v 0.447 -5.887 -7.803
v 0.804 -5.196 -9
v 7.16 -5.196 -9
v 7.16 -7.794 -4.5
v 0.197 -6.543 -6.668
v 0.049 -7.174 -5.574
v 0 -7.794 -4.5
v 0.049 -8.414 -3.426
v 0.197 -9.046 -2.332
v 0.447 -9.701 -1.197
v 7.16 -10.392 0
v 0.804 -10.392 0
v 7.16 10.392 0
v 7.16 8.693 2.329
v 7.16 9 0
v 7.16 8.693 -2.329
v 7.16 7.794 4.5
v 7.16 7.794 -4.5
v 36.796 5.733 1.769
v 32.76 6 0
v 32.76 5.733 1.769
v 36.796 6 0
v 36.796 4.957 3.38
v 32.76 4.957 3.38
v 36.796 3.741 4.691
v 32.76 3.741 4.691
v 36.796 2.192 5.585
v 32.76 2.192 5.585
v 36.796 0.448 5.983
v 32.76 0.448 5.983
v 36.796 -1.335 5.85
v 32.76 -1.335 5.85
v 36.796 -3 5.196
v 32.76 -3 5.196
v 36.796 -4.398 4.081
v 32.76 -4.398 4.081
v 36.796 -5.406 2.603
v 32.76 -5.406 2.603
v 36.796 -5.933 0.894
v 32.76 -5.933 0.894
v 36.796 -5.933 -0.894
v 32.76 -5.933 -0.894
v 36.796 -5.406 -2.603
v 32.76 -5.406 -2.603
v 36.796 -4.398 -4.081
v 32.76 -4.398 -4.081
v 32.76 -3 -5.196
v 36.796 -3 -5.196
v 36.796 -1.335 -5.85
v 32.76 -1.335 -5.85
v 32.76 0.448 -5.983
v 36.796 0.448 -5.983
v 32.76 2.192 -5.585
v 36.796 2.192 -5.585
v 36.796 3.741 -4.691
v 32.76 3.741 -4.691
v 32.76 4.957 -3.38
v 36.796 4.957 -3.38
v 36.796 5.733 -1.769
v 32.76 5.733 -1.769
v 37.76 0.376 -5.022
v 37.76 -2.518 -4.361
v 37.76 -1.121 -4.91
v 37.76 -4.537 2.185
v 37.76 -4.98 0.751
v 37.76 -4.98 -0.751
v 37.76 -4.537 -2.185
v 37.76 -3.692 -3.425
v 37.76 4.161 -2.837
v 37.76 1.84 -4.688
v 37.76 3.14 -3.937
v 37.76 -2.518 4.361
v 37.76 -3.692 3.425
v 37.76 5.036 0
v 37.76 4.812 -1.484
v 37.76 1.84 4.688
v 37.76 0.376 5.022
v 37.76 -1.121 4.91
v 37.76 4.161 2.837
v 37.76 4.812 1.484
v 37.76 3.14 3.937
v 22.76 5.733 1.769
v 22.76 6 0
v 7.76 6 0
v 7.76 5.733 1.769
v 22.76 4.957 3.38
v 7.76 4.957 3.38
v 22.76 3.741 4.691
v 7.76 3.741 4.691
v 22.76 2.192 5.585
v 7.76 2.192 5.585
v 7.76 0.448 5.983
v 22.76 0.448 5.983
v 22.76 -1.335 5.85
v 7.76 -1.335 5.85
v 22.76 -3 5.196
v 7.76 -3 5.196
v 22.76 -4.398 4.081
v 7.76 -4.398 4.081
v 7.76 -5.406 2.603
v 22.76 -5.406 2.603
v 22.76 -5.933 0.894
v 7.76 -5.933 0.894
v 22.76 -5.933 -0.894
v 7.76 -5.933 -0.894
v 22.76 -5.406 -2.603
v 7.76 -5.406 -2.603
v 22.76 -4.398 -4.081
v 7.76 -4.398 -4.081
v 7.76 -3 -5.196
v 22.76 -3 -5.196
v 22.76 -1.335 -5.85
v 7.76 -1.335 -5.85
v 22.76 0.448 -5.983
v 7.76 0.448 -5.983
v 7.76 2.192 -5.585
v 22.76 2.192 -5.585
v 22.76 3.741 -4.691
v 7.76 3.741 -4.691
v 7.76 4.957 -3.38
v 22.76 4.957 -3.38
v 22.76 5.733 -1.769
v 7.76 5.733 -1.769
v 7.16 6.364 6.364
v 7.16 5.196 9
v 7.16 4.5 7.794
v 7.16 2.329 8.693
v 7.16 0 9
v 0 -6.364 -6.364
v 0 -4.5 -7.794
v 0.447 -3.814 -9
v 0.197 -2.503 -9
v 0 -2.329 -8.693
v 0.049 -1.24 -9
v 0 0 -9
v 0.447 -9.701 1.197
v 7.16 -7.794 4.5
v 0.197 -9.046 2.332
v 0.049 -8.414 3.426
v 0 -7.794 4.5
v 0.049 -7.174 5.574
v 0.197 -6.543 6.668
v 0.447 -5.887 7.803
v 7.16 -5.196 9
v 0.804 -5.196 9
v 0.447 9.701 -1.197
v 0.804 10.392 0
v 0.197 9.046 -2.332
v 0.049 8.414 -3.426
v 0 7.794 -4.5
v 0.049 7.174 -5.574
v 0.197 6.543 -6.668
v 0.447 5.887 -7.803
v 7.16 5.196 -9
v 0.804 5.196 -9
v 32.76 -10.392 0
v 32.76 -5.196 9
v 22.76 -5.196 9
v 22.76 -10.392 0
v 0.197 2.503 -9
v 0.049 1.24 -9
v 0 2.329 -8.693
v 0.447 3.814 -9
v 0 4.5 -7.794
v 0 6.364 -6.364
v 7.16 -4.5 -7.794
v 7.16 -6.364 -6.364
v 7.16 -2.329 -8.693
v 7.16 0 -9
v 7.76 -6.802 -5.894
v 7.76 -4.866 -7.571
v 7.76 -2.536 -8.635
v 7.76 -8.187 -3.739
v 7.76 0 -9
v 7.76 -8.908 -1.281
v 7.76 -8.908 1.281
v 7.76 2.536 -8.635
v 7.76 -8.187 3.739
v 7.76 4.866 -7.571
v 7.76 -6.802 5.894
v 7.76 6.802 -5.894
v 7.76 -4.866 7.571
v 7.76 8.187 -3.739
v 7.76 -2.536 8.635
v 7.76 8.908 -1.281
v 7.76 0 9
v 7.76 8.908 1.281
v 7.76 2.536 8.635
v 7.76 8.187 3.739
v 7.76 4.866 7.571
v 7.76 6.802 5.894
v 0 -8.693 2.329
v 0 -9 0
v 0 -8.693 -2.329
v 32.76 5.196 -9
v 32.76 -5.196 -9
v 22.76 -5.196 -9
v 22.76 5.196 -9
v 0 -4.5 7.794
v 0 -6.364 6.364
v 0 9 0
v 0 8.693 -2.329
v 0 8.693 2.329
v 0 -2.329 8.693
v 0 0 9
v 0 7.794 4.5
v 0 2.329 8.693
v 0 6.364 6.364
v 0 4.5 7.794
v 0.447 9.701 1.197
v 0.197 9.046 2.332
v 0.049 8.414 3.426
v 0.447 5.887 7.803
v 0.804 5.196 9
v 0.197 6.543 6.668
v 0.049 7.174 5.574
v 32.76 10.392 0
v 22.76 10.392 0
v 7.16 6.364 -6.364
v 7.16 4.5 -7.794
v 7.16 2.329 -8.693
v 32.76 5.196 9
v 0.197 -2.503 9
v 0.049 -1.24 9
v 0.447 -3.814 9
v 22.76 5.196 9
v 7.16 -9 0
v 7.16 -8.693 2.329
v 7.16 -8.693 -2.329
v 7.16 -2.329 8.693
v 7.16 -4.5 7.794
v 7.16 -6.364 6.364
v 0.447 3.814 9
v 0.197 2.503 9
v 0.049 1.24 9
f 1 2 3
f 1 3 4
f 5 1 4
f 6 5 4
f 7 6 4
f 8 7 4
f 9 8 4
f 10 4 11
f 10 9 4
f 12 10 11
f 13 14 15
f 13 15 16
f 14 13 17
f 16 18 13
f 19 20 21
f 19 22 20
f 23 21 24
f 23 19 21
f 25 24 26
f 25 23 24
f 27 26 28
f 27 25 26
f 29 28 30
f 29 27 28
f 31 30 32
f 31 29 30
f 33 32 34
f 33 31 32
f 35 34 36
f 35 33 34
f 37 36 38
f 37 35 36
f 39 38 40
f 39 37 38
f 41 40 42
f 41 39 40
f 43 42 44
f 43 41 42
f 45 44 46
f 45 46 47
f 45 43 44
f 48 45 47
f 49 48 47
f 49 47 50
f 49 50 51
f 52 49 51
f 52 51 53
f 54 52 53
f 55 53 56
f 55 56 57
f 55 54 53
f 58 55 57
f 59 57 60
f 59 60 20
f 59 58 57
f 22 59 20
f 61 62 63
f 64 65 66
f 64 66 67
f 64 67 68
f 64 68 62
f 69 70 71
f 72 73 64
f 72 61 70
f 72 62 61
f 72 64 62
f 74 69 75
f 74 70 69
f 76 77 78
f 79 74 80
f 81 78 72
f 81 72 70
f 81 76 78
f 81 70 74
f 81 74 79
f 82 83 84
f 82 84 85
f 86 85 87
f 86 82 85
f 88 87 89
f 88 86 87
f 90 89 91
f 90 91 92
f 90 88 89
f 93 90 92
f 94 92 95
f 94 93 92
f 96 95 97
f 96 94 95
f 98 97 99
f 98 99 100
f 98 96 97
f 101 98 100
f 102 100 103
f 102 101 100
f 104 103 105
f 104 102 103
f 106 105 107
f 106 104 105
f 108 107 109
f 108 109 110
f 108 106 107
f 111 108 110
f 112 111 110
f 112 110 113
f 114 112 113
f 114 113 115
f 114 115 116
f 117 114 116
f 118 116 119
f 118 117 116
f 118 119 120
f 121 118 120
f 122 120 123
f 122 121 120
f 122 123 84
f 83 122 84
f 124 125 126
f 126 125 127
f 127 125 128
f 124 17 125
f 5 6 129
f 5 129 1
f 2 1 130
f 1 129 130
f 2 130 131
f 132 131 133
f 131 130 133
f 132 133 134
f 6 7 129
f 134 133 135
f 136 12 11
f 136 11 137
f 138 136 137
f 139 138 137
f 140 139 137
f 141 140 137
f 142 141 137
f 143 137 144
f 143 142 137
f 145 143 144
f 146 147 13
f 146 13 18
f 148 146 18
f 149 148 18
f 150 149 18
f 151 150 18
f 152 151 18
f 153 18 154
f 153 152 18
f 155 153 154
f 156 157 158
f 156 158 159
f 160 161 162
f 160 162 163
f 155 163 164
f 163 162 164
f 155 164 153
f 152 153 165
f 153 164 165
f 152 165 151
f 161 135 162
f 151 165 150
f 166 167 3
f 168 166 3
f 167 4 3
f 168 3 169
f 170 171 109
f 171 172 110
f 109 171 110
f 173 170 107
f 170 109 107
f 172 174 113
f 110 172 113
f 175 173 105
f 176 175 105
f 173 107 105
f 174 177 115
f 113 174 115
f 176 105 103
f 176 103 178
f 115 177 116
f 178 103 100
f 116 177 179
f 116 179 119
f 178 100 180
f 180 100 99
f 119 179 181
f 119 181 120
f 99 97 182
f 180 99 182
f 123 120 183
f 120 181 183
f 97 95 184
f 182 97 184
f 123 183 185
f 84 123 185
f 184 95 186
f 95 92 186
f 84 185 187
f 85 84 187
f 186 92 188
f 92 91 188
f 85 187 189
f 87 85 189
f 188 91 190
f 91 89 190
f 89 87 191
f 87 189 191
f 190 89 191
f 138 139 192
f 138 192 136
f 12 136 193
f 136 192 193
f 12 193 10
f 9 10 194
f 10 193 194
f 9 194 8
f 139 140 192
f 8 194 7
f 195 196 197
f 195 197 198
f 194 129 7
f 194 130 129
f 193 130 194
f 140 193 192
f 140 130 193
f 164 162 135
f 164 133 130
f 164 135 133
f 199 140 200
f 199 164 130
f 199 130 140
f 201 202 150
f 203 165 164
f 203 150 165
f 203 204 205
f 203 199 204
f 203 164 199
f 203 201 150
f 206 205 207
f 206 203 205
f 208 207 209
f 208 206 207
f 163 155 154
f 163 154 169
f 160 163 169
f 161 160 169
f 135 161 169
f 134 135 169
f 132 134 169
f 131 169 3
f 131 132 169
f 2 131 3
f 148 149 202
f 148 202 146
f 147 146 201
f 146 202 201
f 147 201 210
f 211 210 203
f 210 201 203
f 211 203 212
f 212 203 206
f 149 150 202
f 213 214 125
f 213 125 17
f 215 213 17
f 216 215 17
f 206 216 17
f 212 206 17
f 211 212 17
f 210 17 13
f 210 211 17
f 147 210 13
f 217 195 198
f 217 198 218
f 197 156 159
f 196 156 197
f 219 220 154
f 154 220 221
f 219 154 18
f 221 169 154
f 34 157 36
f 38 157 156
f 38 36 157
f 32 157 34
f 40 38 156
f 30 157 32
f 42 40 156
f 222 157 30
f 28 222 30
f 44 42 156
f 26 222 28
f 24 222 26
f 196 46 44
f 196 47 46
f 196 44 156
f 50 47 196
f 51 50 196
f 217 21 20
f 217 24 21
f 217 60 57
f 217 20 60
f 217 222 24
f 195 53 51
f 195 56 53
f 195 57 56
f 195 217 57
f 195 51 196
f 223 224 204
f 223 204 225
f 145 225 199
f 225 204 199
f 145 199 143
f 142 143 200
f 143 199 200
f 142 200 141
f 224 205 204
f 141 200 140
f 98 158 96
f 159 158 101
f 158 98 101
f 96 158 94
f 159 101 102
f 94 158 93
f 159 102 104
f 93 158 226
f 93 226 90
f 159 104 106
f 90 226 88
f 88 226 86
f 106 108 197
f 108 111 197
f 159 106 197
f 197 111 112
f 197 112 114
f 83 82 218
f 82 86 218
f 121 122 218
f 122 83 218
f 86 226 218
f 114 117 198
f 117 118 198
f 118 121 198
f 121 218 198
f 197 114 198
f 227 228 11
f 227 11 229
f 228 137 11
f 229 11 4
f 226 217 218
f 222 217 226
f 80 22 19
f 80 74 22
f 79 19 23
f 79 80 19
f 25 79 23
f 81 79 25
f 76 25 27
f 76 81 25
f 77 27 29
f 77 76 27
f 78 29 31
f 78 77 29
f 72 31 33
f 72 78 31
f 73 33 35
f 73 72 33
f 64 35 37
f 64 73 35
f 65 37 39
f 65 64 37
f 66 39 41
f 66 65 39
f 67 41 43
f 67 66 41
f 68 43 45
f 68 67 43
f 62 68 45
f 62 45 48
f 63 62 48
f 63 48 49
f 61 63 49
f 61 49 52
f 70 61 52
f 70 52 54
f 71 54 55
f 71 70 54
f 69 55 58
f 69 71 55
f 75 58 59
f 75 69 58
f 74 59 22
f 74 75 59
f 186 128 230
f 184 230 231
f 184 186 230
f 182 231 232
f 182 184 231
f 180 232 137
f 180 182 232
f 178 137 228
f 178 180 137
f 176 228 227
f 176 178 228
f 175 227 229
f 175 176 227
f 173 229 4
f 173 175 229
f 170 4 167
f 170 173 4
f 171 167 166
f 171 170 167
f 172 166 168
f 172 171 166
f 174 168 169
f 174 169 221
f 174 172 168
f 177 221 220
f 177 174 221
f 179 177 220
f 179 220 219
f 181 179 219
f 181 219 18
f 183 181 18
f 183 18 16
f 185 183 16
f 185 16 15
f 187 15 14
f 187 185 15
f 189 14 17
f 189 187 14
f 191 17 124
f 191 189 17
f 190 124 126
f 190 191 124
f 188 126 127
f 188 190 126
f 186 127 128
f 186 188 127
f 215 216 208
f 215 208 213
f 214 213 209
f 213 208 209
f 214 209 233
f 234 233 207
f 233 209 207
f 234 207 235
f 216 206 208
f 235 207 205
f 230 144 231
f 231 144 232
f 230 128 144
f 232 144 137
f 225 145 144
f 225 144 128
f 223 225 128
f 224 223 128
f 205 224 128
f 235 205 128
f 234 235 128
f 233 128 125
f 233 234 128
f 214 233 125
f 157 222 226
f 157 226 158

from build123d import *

# Parameters (mm, degrees)
BASEHEAD_DEPTH      = 7.76
SKETCH4_W           = 0.6
SKETCH4_H           = 11.392304845
BOSS_EXTRUDE1_DEPTH = 10


# Read off the part's stored shape, not the designer's step: HeadChamfer
with BuildPart() as part:
    # Sketch1 → BaseHead (new body)
    with BuildSketch(Plane(origin=(0, 0, 0), x_dir=(0, 0, -1), z_dir=(1, 0, 0))):
        Polygon((9, 5.196152423), (9, -5.196152423), (0, -10.392304845), (-9, -5.196152423), (-9, 5.196152423), (0, 10.392304845), align=None)
    extrude(amount=BASEHEAD_DEPTH)

    # HeadChamfer outline → HeadChamfer (revolve, cut)
    with BuildSketch(Plane.YX):
        Polygon((10.392304847, 0.803847578), (9, 0), (10.392304847, 0), align=None)
    revolve(axis=Axis((0, 0, 0), (1, 0, 0)), mode=Mode.SUBTRACT)

    # HeadChamfer 2 outline → HeadChamfer 2 (revolve)
    with BuildSketch(Plane.YX):
        Polygon((6, 7.76), (6, 36.796), (5.036, 37.76), (0, 37.76), (0, 7.76), align=None)
    revolve(axis=Axis((0, 0, 0), (1, 0, 0)))

    # Sketch4 → BearingFace (revolve, cut)
    with BuildSketch(Plane.XY, mode=Mode.PRIVATE) as bearingface_sk:
        with Locations((7.46, 14.696152423)):
            Rectangle(SKETCH4_W, SKETCH4_H)
    revolve(bearingface_sk.sketch.rotate(Axis((0, 0, 0), (1, 0, 0)), 90), axis=Axis((0, 0, 0), (1, 0, 0)), mode=Mode.SUBTRACT)

    # Sketch5 → Boss-Extrude1 (add)
    with BuildSketch(Plane(origin=(32.76, 0, 0), x_dir=(0, 0, -1), z_dir=(1, 0, 0))):
        Polygon((0, 10.392304845), (-9, 5.196152423), (-9, -5.196152423), (0, -10.392304845), (9, -5.196152423), (9, 5.196152423), align=None)
    extrude(amount=-BOSS_EXTRUDE1_DEPTH)


solid = part.part
